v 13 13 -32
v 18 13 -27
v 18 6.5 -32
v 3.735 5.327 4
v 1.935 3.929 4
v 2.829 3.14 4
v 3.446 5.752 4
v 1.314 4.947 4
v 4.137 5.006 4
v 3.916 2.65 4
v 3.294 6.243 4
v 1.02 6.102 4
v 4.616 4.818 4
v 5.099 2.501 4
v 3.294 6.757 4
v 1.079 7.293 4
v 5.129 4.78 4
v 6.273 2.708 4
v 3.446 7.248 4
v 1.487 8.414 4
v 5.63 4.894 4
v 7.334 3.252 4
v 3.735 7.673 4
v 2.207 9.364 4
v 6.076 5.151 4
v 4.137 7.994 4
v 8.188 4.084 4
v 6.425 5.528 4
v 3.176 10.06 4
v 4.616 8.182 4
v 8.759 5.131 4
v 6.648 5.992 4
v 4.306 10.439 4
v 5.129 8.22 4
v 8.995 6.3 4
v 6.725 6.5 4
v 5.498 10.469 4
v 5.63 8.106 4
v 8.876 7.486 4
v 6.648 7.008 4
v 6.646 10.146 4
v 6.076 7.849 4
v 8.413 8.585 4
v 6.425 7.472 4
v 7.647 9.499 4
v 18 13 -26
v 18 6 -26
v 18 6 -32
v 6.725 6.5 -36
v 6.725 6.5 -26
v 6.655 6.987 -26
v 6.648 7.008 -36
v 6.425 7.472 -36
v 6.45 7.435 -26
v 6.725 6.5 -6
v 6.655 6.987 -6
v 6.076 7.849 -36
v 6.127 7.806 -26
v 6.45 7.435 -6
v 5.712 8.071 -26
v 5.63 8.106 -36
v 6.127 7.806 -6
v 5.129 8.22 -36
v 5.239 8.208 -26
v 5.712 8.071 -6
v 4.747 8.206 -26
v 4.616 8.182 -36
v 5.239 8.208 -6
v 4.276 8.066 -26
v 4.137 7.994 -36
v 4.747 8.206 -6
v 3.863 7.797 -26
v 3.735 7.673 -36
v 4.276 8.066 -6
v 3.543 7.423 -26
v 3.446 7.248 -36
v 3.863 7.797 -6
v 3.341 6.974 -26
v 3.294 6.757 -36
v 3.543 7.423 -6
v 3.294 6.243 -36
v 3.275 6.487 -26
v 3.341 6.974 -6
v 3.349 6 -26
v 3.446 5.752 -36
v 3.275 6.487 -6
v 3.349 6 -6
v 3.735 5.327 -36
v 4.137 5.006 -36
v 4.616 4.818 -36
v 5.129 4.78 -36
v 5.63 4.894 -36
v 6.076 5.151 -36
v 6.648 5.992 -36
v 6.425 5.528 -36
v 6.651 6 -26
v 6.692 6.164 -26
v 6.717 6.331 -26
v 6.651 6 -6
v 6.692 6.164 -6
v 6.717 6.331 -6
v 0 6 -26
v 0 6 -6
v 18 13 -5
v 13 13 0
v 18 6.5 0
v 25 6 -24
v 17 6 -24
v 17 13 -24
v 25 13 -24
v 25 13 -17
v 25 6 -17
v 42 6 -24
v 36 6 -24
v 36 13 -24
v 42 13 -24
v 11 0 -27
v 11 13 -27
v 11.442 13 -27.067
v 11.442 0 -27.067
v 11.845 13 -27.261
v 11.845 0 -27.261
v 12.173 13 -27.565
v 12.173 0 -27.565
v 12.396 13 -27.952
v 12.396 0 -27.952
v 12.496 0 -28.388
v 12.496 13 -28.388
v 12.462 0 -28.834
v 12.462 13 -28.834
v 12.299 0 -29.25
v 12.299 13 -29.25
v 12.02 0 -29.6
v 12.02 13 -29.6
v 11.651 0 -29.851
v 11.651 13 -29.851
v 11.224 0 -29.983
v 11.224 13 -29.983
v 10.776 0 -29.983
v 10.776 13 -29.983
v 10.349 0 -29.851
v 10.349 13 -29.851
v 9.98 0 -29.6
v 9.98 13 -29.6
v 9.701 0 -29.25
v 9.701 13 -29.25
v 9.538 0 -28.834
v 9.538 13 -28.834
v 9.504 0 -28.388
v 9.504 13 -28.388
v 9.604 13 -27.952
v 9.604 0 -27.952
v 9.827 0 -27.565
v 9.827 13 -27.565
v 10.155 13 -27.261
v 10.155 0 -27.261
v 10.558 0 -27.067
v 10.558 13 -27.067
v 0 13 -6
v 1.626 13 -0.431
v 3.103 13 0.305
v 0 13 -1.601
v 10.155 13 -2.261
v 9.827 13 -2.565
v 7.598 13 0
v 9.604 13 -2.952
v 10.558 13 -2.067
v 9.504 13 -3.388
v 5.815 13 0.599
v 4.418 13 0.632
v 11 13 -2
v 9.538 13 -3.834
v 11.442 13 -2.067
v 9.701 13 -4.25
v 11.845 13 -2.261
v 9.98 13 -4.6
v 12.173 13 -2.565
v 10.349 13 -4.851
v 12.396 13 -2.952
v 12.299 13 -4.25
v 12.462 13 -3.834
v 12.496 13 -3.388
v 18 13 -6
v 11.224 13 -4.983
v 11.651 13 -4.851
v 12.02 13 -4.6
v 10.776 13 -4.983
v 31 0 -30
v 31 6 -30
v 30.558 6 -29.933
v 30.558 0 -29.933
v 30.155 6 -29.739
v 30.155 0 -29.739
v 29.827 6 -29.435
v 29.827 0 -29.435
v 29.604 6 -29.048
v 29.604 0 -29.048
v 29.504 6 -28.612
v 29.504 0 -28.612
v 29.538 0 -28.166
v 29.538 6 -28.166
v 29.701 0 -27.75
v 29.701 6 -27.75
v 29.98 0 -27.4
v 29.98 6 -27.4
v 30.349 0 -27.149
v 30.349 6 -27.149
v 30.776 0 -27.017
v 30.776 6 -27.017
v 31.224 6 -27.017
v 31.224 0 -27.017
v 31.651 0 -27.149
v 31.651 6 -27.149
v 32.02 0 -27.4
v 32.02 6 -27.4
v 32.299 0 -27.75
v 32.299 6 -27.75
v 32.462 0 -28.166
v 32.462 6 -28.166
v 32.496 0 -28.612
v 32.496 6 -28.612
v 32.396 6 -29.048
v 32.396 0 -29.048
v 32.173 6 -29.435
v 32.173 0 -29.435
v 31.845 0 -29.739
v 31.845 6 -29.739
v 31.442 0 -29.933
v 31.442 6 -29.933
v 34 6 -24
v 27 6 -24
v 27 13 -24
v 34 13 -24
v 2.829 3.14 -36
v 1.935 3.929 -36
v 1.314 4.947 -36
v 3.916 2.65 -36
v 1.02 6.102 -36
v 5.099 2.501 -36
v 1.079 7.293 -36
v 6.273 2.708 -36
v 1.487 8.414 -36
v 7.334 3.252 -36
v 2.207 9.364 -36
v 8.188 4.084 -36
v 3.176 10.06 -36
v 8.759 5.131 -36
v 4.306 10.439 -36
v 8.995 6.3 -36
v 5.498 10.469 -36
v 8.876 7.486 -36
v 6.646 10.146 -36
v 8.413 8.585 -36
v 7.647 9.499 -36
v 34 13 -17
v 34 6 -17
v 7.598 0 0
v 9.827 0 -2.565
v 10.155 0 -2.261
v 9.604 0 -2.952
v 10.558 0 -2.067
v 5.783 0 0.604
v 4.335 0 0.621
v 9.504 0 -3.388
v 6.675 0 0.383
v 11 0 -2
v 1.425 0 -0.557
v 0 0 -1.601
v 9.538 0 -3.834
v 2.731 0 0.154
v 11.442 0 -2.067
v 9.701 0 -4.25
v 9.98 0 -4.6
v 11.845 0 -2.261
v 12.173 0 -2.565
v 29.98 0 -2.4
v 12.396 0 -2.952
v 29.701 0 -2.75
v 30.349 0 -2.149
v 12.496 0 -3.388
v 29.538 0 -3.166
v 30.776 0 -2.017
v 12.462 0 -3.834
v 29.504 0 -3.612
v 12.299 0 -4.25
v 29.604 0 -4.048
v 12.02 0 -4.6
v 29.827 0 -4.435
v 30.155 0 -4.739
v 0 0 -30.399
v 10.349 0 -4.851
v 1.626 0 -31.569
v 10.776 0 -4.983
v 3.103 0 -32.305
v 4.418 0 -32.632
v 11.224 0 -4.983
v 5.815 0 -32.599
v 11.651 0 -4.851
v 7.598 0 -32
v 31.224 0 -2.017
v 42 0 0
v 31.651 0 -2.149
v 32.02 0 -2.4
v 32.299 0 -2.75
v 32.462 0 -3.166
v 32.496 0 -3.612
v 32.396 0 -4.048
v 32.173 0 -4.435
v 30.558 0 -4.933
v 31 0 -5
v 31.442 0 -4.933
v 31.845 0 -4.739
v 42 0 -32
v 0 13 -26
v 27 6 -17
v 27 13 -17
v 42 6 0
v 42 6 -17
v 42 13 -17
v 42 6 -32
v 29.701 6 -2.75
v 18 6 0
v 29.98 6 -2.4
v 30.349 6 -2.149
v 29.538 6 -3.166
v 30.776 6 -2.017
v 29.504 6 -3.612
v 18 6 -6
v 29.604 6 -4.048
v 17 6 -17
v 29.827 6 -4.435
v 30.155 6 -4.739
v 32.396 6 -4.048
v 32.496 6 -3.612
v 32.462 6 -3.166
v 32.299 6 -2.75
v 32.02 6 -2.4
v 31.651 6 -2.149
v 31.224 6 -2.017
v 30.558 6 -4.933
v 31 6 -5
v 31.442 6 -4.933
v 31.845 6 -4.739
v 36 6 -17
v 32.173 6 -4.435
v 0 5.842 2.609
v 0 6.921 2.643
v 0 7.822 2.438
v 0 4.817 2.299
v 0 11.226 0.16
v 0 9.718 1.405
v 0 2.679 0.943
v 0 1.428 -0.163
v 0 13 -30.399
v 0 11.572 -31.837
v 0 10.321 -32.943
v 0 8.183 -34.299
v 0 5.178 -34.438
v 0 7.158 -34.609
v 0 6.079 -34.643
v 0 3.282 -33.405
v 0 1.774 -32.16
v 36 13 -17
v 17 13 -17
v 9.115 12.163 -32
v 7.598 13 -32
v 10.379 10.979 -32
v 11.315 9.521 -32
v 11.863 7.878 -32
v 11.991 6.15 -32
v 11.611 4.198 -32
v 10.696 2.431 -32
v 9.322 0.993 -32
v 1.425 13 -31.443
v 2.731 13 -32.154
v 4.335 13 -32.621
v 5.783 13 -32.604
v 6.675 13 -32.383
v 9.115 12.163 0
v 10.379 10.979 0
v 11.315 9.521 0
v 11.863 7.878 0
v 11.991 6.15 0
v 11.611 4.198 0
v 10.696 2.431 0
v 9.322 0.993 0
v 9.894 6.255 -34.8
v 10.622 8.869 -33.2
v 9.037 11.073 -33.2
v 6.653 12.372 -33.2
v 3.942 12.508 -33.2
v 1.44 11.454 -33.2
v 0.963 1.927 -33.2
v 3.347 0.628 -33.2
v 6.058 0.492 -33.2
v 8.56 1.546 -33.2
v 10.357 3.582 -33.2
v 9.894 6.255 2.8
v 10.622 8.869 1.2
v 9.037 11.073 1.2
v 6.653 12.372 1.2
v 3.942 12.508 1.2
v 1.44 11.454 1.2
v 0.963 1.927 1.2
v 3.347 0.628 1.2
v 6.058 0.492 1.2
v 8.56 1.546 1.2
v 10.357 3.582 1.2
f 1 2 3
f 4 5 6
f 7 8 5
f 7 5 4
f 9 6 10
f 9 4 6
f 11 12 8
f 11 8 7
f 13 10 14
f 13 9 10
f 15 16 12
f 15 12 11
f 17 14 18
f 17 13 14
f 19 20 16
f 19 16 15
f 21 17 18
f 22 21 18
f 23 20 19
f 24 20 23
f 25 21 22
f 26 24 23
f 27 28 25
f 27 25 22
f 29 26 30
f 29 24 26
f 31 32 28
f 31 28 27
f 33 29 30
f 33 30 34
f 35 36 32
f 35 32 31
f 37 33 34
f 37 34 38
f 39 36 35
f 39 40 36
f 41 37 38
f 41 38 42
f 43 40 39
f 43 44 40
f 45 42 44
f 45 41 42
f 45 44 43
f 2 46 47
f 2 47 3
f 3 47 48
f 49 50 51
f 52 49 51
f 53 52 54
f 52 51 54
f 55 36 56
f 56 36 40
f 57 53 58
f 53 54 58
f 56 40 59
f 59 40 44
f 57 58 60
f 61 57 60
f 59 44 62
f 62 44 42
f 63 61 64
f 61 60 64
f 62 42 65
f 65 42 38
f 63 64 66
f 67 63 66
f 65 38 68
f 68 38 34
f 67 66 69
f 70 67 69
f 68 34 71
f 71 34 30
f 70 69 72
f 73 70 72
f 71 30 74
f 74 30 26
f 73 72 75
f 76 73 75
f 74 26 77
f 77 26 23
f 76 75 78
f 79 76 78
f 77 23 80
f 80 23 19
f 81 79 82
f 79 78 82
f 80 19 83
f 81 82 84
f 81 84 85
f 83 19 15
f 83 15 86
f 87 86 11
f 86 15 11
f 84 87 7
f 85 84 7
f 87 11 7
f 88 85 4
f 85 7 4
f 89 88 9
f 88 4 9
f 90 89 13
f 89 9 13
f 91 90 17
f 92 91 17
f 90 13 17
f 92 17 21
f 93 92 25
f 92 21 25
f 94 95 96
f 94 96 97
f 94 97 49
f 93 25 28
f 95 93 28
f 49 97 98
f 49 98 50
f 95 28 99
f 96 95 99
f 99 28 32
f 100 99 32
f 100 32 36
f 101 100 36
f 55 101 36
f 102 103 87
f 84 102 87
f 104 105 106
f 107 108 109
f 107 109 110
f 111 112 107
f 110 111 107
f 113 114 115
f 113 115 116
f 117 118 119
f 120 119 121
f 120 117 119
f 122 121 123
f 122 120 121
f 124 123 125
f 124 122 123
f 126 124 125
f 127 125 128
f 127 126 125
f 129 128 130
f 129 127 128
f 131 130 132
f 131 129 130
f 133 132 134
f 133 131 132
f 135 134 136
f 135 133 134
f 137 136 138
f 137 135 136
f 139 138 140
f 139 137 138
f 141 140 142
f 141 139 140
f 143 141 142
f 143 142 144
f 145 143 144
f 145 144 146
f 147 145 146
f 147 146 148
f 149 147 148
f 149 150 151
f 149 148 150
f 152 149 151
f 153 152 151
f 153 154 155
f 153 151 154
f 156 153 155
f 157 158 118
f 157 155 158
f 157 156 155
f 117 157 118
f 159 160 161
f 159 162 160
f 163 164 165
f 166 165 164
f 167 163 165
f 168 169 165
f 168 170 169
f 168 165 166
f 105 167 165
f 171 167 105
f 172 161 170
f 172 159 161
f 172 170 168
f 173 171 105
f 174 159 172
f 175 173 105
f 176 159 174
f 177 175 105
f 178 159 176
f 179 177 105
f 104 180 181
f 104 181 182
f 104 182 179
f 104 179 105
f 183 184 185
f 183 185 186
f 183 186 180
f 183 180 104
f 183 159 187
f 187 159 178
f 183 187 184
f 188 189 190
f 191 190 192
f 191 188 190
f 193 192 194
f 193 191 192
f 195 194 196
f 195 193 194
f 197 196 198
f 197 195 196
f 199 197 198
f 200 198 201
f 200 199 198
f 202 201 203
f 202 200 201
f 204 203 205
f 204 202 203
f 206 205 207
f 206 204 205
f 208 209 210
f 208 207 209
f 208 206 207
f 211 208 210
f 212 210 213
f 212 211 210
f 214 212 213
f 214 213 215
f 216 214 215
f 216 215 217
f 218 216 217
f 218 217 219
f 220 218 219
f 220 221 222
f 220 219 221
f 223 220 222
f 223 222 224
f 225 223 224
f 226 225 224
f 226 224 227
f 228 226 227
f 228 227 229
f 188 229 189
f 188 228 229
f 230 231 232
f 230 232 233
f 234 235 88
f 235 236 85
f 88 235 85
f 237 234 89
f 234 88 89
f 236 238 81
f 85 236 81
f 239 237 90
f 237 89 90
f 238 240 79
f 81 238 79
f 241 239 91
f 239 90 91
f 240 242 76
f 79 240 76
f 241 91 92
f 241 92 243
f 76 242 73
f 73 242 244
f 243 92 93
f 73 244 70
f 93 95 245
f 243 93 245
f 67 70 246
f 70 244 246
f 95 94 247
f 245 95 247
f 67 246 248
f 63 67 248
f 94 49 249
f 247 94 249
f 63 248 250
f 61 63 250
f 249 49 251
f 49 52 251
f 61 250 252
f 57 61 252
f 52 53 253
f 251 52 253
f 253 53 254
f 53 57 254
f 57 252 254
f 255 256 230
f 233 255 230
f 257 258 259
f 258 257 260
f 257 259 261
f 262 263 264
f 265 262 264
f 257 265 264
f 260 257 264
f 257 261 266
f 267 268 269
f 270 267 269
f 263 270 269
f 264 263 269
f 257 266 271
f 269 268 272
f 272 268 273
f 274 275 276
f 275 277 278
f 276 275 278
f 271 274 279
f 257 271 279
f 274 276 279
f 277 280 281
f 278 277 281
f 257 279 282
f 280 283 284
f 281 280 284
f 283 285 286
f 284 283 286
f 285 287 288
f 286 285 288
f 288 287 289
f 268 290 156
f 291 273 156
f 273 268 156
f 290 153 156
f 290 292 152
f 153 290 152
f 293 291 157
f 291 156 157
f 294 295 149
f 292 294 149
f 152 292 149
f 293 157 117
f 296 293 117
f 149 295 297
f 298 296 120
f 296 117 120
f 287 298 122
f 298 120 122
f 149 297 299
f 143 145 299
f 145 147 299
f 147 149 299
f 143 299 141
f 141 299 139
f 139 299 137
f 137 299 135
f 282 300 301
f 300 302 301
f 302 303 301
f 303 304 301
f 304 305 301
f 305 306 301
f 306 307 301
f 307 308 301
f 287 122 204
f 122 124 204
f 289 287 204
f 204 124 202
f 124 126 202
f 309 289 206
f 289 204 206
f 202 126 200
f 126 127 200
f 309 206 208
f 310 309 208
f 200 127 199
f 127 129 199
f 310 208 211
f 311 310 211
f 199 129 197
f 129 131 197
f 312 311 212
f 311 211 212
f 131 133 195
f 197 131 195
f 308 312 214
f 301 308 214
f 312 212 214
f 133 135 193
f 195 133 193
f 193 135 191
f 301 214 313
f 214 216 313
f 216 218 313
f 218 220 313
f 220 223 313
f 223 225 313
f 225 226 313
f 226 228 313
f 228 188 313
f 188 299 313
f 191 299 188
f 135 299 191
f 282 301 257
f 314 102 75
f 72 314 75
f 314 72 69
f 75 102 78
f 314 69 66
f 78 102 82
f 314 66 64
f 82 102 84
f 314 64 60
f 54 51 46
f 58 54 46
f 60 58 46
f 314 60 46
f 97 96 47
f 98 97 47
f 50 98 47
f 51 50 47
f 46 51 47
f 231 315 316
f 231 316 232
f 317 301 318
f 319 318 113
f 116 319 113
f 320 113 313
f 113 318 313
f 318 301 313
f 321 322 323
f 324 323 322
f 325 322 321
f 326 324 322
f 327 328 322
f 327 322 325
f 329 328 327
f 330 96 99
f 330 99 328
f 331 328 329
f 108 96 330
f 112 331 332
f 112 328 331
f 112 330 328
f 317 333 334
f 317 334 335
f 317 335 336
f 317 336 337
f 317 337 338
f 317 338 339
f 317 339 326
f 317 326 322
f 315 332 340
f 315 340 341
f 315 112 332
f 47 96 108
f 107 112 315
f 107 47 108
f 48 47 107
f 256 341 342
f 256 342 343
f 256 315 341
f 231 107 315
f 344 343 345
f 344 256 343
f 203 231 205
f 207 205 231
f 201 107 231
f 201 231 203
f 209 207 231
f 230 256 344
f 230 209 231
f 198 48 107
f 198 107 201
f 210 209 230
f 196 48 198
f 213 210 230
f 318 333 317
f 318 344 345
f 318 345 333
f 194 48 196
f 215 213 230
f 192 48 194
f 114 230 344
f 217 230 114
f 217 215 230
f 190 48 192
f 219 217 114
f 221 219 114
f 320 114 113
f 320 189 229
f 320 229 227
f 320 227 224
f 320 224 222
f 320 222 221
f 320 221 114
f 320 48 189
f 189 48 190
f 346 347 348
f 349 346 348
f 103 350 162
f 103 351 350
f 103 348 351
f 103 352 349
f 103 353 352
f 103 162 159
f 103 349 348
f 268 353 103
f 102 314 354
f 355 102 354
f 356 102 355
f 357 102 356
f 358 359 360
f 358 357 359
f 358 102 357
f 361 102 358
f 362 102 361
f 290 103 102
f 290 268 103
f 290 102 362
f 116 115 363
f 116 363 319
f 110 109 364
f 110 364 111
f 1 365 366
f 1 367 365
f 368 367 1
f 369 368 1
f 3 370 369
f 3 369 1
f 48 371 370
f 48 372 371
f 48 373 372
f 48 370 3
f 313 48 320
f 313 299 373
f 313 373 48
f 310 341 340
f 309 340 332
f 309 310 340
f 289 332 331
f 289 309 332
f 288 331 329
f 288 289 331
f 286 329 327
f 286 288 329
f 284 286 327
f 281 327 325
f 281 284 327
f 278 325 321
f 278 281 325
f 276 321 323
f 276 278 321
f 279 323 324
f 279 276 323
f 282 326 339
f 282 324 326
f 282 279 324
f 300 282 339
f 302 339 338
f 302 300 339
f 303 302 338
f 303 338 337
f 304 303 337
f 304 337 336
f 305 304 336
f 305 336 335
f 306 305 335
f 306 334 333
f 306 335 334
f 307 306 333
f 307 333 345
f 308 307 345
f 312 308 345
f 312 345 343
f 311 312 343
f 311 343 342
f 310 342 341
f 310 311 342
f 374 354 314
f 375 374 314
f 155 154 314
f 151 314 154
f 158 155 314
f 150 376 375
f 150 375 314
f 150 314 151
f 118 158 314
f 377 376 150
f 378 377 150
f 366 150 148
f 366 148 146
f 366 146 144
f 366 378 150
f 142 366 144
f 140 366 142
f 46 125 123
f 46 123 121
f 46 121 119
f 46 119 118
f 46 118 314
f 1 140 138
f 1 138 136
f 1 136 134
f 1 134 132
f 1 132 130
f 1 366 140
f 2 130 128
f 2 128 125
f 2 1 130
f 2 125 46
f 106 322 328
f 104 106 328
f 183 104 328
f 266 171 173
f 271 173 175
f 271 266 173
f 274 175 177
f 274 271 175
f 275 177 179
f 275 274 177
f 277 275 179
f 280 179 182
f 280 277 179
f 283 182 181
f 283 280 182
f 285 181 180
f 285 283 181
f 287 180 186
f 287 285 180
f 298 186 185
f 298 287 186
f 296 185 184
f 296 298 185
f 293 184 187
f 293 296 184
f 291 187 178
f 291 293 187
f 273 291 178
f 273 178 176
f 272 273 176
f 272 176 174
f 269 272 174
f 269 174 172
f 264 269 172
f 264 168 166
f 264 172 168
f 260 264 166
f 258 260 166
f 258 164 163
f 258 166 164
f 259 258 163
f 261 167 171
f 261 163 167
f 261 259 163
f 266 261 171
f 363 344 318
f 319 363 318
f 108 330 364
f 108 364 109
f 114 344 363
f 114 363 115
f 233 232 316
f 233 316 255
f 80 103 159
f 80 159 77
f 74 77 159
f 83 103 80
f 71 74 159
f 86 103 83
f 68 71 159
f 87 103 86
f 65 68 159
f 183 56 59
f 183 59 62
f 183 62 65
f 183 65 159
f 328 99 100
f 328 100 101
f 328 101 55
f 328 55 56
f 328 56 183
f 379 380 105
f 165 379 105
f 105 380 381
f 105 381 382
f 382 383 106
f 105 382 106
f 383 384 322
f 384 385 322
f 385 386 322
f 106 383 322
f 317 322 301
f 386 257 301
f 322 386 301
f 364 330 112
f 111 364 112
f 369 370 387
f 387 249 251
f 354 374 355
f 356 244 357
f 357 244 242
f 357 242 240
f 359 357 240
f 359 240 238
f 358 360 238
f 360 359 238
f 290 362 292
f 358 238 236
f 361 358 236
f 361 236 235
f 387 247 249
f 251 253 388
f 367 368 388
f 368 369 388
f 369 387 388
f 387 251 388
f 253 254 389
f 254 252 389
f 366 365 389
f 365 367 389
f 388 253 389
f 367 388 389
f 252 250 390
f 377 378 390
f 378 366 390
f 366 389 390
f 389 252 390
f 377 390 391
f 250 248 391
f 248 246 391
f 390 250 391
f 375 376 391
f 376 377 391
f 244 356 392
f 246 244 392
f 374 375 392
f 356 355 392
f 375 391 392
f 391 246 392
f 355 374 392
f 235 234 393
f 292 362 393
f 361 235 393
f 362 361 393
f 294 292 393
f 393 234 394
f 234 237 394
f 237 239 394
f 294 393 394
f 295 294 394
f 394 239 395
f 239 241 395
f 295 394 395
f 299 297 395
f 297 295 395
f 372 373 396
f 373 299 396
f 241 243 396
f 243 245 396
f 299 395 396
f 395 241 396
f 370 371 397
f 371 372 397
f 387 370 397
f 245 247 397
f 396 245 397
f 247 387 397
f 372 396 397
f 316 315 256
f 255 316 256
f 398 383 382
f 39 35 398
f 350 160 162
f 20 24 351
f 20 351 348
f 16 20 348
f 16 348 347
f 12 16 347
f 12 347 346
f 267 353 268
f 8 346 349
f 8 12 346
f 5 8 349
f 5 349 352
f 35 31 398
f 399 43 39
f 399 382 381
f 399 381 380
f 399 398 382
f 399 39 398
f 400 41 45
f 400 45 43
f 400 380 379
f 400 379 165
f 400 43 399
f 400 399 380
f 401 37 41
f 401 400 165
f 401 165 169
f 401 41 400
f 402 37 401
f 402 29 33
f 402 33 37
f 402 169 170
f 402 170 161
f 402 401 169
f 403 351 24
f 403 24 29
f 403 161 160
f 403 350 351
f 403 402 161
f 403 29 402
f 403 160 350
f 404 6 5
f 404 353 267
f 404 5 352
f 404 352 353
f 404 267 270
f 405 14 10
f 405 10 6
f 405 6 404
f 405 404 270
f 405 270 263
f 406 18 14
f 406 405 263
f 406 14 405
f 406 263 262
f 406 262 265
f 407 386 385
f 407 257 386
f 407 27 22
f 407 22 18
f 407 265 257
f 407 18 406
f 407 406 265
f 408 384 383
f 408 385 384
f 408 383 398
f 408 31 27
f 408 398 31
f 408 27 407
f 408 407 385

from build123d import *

# Parameters (mm, degrees)
SKETCH1_W           = 42
SKETCH1_H           = 32
BOSS_EXTRUDE1_DEPTH = 6
SKETCH4_W           = 18
SKETCH4_H           = 6
SKETCH4_W_2         = 7
SKETCH4_H_2         = 7
SKETCH4_W_3         = 6
SKETCH4_W_4         = 8
BOSS_EXTRUDE2_DEPTH = 7
SKETCH9_R           = 1.725
CUT_EXTRUDE2_DEPTH  = 61.301326685
SKETCH10_W          = 6
SKETCH10_H          = 13
BOSS_EXTRUDE5_DEPTH = 11
SKETCH5_R           = 1.5
CUT_EXTRUDE3_DEPTH  = 57.824290581
CHAMFER1_START      = 14.286772629
CHAMFER1_DEPTH      = 3.105820136
CHAMFER2_START      = -5.671483031
CHAMFER2_DEPTH      = 11.890532792


with BuildPart() as part:
    # Sketch1 → Boss-Extrude1 (new body)
    with BuildSketch(Plane(origin=(0, 0, 0), x_dir=(1, 0, 0), z_dir=(0, 1, 0))):
        with Locations((21, 16)):
            Rectangle(SKETCH1_W, SKETCH1_H)
    extrude(amount=BOSS_EXTRUDE1_DEPTH)

    # Sketch3 → Revolve2 (revolve)
    with BuildSketch(Plane(origin=(0, 6.5, 0), x_dir=(1, 0, 0), z_dir=(0, 1, 0)), mode=Mode.PRIVATE) as revolve2_sk:
        Polygon((5, 28), (-5, 28), (1, 36), (5, 36), align=None)
        Polygon((5, -4), (5, 4), (-5, 4), (1, -4), align=None)
    revolve(revolve2_sk.sketch.rotate(Axis((5, 6.5, -28), (0, 0, 1)), 177.134016017), axis=Axis((5, 6.5, -28), (0, 0, 1)))

    # Sketch4 → Boss-Extrude2 (add)
    with BuildSketch(Plane(origin=(0, 6, 0), x_dir=(1, 0, 0), z_dir=(0, 1, 0))):
        with Locations((9, 29)):
            Rectangle(SKETCH4_W, SKETCH4_H)
        with Locations((30.5, 20.5)):
            Rectangle(SKETCH4_W_2, SKETCH4_H_2)
        with Locations((39, 20.5)):
            Rectangle(SKETCH4_W_3, SKETCH4_H_2)
        with Locations((21, 20.5)):
            Rectangle(SKETCH4_W_4, SKETCH4_H_2)
        with Locations((9, 3)):
            Rectangle(SKETCH4_W, SKETCH4_H)
    extrude(amount=BOSS_EXTRUDE2_DEPTH)

    # Sketch7 → Cut-Revolve1 (revolve, cut)
    with BuildSketch(Plane(origin=(0, 6.5, 0), x_dir=(1, 0, 0), z_dir=(0, 1, 0))):
        Polygon((-5, 4), (1, -4), (-5, -4), align=None)
        Polygon((-5, 28), (1, 36), (-5, 36), align=None)
    revolve(axis=Axis((5, 6.5, -36), (0, 0, 1)), mode=Mode.SUBTRACT)

    # Sketch9 → Cut-Extrude2 (cut, through all)
    with BuildSketch(Plane.XY.offset(4)):
        with Locations((5, 6.5)):
            Circle(SKETCH9_R)
        Polygon((18, 13), (0, 13), (0, 0), (18, 0), (18, -5), (-7, -5), (-7, 18), (18, 18), align=None)
    extrude(amount=-CUT_EXTRUDE2_DEPTH, mode=Mode.SUBTRACT)

    # Sketch10 → Boss-Extrude5 (add)
    with BuildSketch(Plane(origin=(18, 0, 0), x_dir=(0, 0, -1), z_dir=(1, 0, 0))):
        with Locations((3, 6.5)):
            Rectangle(SKETCH10_W, SKETCH10_H)
        with Locations((29, 6.5)):
            Rectangle(SKETCH10_W, SKETCH10_H)
    extrude(amount=-BOSS_EXTRUDE5_DEPTH)

    # Sketch5 → Cut-Extrude3 (cut, through all)
    with BuildSketch(Plane(origin=(0, 0, 0), x_dir=(1, 0, 0), z_dir=(0, 1, 0))):
        with Locations(Location((11, 28.5, 0), (0, 0, 270))):
            Circle(SKETCH5_R)
        with Locations(Location((31, 28.5, 0), (0, 0, 90))):
            Circle(SKETCH5_R)
        with Locations(Location((31, 3.5, 0), (0, 0, 90))):
            Circle(SKETCH5_R)
        with Locations(Location((11, 3.5, 0), (0, 0, 270))):
            Circle(SKETCH5_R)
    extrude(amount=CUT_EXTRUDE3_DEPTH, mode=Mode.SUBTRACT)

    # Chamfer1: read off the stored shape, not the designer's step
    # Chamfer1 outline → Chamfer1 (cut)
    with BuildSketch(Plane(origin=(0, 0, 0), x_dir=(0.7836805797909963, -0.3787303917205566, -0.49234950923672277), z_dir=(0.6211640273377459, 0.4778184825674969, 0.6211640273377449)).offset(CHAMFER1_START)):
        Polygon((11.64450289, 5.152055929), (11.64450289, 13.352665663), (5.264352445, 10.304111858), align=None)
    extrude(amount=CHAMFER1_DEPTH, mode=Mode.SUBTRACT)

    # Chamfer2: read off the stored shape, not the designer's step
    # Chamfer2 outline → Chamfer2 (cut)
    with BuildSketch(Plane(origin=(0, 0, 0), x_dir=(0.7926239891045996, 0.6097107608496931, 0), z_dir=(0.6097107608496931, -0.7926239891045995, 0)).offset(CHAMFER2_START)):
        Polygon((22.193471695, -27), (18.230351749, -32), (24, -32), (24, -25), (23.778719673, -25), align=None)
    extrude(amount=CHAMFER2_DEPTH, mode=Mode.SUBTRACT)


solid = part.part
